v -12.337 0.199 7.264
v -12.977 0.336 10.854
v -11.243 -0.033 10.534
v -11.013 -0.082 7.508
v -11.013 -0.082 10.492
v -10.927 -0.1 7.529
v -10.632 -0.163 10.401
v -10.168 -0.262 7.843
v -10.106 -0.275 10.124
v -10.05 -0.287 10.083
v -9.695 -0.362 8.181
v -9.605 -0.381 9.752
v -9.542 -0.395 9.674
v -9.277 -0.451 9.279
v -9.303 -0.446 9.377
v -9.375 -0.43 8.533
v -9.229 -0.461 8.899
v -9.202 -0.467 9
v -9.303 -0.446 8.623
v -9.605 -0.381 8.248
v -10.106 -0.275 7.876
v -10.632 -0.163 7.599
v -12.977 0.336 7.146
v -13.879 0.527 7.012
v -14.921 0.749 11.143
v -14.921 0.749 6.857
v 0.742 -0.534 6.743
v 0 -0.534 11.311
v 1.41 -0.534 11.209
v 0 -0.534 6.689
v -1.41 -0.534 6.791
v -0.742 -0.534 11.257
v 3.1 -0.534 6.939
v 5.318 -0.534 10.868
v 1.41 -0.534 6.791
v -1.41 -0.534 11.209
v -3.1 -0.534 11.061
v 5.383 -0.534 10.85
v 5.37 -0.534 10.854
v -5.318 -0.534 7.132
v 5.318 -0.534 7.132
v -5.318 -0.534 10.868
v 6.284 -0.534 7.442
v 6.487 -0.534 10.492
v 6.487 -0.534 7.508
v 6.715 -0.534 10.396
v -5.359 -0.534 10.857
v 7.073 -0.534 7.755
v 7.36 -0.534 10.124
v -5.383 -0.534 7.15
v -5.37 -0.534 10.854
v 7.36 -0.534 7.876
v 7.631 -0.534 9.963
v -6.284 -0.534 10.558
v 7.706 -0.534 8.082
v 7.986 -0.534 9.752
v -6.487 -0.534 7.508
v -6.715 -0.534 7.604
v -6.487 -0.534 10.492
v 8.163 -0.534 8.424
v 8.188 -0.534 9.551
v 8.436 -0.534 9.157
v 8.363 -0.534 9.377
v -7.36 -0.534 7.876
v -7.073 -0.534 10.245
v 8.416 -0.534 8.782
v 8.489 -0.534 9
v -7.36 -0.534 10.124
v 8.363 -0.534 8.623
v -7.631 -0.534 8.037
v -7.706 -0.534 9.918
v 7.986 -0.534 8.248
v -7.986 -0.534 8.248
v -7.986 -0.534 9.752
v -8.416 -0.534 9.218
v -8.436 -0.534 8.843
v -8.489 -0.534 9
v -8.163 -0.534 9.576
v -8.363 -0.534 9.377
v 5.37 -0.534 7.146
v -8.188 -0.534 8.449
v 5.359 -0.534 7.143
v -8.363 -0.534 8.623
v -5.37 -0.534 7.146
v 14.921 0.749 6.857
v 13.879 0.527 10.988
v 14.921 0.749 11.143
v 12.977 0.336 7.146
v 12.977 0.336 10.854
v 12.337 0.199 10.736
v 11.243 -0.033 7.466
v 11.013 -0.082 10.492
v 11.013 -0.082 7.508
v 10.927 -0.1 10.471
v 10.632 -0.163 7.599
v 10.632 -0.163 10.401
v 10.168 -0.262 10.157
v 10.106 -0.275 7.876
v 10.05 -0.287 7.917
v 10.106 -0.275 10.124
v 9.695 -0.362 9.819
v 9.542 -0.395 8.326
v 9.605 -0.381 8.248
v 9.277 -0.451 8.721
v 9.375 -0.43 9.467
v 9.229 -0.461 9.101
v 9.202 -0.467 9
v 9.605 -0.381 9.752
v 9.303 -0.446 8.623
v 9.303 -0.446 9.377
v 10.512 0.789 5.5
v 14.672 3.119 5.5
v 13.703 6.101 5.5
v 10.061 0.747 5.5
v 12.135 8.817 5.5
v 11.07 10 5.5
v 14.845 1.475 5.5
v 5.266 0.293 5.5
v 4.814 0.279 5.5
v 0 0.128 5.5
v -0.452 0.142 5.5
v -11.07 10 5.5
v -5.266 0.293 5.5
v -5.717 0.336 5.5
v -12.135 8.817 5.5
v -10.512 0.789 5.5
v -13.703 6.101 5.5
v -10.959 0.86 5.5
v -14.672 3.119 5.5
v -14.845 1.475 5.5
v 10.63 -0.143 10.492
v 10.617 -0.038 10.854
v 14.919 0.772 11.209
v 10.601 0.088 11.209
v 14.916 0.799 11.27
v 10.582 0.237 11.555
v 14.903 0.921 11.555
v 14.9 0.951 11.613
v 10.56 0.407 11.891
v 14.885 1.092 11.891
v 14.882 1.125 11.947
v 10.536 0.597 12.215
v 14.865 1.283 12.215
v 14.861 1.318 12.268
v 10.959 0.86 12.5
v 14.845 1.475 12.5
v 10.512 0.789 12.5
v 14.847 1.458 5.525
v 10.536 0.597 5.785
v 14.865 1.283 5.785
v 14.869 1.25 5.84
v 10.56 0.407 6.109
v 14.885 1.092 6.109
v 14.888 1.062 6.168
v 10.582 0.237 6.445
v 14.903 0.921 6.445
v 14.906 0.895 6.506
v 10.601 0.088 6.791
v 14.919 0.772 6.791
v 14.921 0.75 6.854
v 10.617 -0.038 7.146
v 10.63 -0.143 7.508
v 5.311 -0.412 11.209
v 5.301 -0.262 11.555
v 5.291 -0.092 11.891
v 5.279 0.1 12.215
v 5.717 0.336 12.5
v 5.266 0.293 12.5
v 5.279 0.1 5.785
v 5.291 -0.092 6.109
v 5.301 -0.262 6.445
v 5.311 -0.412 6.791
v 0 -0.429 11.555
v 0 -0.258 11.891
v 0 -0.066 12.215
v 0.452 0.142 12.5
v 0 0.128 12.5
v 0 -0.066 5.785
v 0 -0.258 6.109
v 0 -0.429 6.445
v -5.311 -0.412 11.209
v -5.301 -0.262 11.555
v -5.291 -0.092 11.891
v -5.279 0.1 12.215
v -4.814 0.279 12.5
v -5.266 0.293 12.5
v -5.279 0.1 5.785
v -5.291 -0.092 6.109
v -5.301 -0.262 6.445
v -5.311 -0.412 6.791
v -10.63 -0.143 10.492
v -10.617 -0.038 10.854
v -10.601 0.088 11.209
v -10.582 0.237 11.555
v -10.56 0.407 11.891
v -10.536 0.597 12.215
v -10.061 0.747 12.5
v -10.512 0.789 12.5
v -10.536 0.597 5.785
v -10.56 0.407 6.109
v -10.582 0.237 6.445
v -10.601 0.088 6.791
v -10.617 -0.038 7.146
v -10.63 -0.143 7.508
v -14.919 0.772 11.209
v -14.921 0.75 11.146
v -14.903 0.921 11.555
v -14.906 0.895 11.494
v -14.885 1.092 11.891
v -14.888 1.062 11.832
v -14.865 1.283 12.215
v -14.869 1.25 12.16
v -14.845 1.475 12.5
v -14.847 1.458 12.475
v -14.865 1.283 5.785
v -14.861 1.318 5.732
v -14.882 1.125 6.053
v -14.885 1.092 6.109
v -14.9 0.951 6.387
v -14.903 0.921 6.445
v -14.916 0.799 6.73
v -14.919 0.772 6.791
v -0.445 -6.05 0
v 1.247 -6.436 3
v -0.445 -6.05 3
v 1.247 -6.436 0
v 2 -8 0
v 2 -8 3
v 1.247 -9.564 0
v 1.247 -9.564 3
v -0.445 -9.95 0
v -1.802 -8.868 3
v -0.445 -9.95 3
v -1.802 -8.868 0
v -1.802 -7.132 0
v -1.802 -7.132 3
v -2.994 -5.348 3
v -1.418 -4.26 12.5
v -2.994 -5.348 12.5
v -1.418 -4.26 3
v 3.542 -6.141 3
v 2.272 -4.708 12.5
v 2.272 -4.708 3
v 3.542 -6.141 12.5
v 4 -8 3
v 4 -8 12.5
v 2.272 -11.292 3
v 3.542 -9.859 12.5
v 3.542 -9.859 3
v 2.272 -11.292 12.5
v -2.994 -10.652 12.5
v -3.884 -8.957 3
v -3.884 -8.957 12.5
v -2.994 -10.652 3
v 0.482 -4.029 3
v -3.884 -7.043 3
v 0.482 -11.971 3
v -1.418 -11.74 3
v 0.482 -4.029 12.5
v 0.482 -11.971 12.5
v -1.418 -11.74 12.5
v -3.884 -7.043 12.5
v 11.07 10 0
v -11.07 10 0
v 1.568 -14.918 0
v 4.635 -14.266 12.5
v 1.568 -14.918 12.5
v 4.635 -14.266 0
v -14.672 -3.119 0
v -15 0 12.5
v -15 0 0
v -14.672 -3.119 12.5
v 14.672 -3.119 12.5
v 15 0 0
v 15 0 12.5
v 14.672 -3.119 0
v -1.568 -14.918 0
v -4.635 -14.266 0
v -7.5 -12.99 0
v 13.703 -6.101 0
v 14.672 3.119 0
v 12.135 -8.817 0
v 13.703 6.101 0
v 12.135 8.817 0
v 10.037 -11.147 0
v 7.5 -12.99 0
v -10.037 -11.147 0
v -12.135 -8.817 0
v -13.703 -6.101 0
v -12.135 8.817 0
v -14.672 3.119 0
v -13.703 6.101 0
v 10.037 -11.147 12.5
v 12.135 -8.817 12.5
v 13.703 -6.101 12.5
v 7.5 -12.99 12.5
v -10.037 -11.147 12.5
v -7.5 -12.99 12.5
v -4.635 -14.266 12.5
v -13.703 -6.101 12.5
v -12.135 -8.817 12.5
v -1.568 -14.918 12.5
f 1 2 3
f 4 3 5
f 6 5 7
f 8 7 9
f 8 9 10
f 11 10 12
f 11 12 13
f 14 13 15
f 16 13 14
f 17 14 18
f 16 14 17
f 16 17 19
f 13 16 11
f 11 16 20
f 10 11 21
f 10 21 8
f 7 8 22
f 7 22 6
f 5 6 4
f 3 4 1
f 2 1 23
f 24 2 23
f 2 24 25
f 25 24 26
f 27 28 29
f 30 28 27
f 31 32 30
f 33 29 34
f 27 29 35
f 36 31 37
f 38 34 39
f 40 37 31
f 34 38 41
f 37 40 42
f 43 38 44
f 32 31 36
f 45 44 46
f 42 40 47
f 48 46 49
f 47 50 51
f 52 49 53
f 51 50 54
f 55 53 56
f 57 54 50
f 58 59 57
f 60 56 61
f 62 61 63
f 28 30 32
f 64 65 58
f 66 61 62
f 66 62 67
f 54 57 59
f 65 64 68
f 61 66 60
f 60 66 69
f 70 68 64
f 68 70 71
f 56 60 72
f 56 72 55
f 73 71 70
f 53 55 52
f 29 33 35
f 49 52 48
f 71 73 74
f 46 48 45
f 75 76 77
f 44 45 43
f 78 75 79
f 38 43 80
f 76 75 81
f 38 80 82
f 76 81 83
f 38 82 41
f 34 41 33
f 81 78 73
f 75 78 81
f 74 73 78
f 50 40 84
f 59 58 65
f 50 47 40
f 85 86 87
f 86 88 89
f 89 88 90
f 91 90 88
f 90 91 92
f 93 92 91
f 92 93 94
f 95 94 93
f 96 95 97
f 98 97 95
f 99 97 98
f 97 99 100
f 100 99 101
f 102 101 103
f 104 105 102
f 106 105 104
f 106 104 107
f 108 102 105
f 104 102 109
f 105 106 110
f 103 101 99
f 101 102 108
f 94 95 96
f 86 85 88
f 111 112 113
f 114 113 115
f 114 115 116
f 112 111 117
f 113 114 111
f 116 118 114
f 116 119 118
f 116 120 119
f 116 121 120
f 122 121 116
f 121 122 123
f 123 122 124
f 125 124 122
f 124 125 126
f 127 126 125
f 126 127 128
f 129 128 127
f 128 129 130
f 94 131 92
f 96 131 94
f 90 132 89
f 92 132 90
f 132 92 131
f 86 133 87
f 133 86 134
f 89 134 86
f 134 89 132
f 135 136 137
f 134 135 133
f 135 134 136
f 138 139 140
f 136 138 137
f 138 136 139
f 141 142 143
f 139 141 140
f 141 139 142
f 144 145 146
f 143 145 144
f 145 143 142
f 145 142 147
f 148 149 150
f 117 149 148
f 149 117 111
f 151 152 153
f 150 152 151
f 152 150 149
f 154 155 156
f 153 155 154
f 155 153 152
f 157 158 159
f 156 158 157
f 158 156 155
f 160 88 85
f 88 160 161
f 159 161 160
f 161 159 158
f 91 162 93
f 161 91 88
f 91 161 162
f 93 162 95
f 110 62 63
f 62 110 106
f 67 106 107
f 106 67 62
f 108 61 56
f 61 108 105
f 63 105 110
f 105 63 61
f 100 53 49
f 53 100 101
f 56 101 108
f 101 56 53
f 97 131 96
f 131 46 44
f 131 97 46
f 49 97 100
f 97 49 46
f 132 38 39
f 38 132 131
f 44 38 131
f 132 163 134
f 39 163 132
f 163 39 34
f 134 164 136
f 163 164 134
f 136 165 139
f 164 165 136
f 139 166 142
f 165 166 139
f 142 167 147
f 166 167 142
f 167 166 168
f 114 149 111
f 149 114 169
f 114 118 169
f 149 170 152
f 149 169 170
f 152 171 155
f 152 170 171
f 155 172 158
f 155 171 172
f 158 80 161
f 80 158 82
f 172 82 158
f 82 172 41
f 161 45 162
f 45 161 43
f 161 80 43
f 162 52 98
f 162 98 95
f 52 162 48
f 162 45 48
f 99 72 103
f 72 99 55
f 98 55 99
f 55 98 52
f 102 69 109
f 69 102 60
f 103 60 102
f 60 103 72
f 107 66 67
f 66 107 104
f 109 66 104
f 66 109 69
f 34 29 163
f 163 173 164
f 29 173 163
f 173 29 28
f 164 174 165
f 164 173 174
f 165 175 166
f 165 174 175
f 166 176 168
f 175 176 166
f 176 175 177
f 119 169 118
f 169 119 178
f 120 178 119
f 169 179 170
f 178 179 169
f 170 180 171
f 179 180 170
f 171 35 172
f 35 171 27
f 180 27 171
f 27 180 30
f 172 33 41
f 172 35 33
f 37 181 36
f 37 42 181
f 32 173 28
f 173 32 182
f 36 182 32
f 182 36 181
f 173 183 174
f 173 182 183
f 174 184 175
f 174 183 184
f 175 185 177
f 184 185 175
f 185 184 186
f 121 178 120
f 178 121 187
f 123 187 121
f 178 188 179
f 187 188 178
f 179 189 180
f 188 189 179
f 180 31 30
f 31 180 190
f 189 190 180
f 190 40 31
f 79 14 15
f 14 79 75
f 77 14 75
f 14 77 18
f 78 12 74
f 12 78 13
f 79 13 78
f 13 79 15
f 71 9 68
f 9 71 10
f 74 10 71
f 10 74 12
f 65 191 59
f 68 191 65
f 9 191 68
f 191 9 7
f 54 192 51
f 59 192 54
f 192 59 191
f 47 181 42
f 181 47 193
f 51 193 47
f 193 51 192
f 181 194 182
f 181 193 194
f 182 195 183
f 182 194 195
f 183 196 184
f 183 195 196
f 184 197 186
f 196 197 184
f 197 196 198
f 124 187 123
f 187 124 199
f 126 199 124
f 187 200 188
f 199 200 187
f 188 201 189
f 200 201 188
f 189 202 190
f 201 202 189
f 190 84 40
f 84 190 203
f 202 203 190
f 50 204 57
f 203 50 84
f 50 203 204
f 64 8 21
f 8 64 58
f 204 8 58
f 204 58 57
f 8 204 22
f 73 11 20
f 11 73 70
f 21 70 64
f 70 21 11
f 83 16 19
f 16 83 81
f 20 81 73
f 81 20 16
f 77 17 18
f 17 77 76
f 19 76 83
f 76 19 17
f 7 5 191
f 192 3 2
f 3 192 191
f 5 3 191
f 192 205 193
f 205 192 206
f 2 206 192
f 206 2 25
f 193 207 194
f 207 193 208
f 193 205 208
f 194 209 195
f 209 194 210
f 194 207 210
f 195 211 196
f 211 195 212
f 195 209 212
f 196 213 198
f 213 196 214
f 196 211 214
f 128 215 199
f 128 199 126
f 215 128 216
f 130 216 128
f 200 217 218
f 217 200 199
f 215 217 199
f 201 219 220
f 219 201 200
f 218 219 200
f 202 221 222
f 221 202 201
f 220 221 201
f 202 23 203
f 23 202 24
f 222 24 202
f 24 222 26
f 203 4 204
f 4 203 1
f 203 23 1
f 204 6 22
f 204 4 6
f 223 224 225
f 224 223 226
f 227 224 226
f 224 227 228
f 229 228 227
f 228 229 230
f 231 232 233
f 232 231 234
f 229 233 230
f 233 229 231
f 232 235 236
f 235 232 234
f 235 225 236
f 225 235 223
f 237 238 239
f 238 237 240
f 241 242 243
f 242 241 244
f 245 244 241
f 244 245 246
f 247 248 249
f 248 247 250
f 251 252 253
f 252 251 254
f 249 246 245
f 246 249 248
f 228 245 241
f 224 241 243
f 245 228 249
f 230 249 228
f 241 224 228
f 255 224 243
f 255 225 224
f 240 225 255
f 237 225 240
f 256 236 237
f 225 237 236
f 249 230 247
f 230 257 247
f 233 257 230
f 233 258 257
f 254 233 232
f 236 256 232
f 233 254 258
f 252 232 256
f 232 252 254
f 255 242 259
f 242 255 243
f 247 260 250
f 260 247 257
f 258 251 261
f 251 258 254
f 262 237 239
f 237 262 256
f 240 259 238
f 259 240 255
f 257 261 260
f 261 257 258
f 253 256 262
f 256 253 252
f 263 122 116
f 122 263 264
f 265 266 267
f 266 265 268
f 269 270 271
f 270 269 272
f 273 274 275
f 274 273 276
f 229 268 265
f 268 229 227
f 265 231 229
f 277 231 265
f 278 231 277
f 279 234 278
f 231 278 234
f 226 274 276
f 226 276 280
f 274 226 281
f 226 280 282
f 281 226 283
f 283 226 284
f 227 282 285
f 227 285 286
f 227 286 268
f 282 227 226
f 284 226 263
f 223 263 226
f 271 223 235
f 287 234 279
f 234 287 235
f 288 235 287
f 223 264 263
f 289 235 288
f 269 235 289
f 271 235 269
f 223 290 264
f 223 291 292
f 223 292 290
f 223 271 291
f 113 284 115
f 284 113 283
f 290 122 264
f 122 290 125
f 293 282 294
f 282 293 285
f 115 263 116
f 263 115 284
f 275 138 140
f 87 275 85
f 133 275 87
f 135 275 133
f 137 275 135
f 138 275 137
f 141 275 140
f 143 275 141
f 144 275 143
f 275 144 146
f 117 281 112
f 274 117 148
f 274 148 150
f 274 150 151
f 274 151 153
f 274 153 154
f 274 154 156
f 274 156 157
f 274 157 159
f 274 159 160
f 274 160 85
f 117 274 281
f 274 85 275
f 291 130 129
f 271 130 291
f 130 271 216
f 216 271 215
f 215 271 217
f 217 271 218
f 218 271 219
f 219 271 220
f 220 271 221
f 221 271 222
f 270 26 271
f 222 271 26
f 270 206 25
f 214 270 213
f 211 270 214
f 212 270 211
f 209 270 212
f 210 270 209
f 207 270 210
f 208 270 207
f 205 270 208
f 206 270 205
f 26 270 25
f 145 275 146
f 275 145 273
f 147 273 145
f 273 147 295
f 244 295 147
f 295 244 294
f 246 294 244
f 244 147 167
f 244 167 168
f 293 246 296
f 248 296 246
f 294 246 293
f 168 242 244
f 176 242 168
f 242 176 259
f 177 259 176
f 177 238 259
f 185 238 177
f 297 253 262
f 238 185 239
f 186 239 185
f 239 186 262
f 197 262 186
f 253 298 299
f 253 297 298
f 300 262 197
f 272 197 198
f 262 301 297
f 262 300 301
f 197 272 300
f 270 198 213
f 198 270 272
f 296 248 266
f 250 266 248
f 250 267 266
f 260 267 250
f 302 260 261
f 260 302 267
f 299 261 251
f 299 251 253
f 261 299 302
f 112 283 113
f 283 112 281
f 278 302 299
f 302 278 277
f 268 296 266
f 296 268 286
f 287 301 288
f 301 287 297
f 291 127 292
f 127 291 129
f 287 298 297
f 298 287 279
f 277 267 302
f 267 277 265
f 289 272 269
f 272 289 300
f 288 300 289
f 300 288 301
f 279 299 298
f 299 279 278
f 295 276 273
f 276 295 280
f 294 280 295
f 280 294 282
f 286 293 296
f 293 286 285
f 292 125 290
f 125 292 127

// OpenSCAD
// diameter of holder in mm
DIAMETER = 30;

// height of glass bed in mm
BED_THICKNESS = 7;

// distance between openbeam bar to bed lower corner in mm
OPENBEAM_TO_BED_DIST = 5.5;

// diameter of bed in mm
BED_DIAMETER = 170;

// length of part holding the bed in mm, this does not include the part with
// the screw
HOLDER_LENGTH = 16;

//
HOLDER_CUT_OFF = 5;

// diameter sinking for screw
SCREW_HEAD_DIAMETER = 8;

// diameter of screw
SCREW_DIAMETER = 4;

// length of hole for screw in mm
SCREW_LENGTH = 3;

// position of screw hole in mm, distance to outer edge
SCREW_POS = (DIAMETER - HOLDER_LENGTH)/2.;

ROUND_BED_EDGE = true;

// radius of roundness in mm, smaller number more round
BED_ROUNDNESS = 6;

/* * * * * * * * * * * * * * * * * * * * * * * * * */

tot_height = OPENBEAM_TO_BED_DIST + BED_THICKNESS;

difference() {
    cylinder(d=DIAMETER, h=tot_height);
    union() {
        // this is the bed
        translate([0.,
                   -HOLDER_LENGTH + BED_DIAMETER/2. + DIAMETER / 2.,
                   OPENBEAM_TO_BED_DIST])
        {
            union() {
                intersection() {
                    cylinder(d=BED_DIAMETER, h=BED_THICKNESS*2);
                    if (ROUND_BED_EDGE) {
                        translate([0., 0., BED_THICKNESS/2.])
                            rotate_extrude(convexity = 10, $fn = 100)
                                translate([BED_DIAMETER/2. - BED_ROUNDNESS, 0, 0]) {
                                    circle(r = BED_ROUNDNESS, $fn = 100);
                                }
                    }
                }
                cylinder(d=BED_DIAMETER-BED_ROUNDNESS, h=BED_THICKNESS*2);
            }
        }

        translate([0., -DIAMETER/2. + SCREW_POS, ]) {
            // this is the screw
            translate([0., 0., -tot_height/4.])
                cylinder(d=SCREW_DIAMETER, h=tot_height*2);

            // screw head
            translate([0., 0., SCREW_LENGTH])
                cylinder(d=SCREW_HEAD_DIAMETER, h=tot_height);
        }

        // cut off
        translate([0., DIAMETER - HOLDER_CUT_OFF, tot_height * 3./4.])
            cube([DIAMETER, DIAMETER, 2*tot_height], center=true);
    }
}
